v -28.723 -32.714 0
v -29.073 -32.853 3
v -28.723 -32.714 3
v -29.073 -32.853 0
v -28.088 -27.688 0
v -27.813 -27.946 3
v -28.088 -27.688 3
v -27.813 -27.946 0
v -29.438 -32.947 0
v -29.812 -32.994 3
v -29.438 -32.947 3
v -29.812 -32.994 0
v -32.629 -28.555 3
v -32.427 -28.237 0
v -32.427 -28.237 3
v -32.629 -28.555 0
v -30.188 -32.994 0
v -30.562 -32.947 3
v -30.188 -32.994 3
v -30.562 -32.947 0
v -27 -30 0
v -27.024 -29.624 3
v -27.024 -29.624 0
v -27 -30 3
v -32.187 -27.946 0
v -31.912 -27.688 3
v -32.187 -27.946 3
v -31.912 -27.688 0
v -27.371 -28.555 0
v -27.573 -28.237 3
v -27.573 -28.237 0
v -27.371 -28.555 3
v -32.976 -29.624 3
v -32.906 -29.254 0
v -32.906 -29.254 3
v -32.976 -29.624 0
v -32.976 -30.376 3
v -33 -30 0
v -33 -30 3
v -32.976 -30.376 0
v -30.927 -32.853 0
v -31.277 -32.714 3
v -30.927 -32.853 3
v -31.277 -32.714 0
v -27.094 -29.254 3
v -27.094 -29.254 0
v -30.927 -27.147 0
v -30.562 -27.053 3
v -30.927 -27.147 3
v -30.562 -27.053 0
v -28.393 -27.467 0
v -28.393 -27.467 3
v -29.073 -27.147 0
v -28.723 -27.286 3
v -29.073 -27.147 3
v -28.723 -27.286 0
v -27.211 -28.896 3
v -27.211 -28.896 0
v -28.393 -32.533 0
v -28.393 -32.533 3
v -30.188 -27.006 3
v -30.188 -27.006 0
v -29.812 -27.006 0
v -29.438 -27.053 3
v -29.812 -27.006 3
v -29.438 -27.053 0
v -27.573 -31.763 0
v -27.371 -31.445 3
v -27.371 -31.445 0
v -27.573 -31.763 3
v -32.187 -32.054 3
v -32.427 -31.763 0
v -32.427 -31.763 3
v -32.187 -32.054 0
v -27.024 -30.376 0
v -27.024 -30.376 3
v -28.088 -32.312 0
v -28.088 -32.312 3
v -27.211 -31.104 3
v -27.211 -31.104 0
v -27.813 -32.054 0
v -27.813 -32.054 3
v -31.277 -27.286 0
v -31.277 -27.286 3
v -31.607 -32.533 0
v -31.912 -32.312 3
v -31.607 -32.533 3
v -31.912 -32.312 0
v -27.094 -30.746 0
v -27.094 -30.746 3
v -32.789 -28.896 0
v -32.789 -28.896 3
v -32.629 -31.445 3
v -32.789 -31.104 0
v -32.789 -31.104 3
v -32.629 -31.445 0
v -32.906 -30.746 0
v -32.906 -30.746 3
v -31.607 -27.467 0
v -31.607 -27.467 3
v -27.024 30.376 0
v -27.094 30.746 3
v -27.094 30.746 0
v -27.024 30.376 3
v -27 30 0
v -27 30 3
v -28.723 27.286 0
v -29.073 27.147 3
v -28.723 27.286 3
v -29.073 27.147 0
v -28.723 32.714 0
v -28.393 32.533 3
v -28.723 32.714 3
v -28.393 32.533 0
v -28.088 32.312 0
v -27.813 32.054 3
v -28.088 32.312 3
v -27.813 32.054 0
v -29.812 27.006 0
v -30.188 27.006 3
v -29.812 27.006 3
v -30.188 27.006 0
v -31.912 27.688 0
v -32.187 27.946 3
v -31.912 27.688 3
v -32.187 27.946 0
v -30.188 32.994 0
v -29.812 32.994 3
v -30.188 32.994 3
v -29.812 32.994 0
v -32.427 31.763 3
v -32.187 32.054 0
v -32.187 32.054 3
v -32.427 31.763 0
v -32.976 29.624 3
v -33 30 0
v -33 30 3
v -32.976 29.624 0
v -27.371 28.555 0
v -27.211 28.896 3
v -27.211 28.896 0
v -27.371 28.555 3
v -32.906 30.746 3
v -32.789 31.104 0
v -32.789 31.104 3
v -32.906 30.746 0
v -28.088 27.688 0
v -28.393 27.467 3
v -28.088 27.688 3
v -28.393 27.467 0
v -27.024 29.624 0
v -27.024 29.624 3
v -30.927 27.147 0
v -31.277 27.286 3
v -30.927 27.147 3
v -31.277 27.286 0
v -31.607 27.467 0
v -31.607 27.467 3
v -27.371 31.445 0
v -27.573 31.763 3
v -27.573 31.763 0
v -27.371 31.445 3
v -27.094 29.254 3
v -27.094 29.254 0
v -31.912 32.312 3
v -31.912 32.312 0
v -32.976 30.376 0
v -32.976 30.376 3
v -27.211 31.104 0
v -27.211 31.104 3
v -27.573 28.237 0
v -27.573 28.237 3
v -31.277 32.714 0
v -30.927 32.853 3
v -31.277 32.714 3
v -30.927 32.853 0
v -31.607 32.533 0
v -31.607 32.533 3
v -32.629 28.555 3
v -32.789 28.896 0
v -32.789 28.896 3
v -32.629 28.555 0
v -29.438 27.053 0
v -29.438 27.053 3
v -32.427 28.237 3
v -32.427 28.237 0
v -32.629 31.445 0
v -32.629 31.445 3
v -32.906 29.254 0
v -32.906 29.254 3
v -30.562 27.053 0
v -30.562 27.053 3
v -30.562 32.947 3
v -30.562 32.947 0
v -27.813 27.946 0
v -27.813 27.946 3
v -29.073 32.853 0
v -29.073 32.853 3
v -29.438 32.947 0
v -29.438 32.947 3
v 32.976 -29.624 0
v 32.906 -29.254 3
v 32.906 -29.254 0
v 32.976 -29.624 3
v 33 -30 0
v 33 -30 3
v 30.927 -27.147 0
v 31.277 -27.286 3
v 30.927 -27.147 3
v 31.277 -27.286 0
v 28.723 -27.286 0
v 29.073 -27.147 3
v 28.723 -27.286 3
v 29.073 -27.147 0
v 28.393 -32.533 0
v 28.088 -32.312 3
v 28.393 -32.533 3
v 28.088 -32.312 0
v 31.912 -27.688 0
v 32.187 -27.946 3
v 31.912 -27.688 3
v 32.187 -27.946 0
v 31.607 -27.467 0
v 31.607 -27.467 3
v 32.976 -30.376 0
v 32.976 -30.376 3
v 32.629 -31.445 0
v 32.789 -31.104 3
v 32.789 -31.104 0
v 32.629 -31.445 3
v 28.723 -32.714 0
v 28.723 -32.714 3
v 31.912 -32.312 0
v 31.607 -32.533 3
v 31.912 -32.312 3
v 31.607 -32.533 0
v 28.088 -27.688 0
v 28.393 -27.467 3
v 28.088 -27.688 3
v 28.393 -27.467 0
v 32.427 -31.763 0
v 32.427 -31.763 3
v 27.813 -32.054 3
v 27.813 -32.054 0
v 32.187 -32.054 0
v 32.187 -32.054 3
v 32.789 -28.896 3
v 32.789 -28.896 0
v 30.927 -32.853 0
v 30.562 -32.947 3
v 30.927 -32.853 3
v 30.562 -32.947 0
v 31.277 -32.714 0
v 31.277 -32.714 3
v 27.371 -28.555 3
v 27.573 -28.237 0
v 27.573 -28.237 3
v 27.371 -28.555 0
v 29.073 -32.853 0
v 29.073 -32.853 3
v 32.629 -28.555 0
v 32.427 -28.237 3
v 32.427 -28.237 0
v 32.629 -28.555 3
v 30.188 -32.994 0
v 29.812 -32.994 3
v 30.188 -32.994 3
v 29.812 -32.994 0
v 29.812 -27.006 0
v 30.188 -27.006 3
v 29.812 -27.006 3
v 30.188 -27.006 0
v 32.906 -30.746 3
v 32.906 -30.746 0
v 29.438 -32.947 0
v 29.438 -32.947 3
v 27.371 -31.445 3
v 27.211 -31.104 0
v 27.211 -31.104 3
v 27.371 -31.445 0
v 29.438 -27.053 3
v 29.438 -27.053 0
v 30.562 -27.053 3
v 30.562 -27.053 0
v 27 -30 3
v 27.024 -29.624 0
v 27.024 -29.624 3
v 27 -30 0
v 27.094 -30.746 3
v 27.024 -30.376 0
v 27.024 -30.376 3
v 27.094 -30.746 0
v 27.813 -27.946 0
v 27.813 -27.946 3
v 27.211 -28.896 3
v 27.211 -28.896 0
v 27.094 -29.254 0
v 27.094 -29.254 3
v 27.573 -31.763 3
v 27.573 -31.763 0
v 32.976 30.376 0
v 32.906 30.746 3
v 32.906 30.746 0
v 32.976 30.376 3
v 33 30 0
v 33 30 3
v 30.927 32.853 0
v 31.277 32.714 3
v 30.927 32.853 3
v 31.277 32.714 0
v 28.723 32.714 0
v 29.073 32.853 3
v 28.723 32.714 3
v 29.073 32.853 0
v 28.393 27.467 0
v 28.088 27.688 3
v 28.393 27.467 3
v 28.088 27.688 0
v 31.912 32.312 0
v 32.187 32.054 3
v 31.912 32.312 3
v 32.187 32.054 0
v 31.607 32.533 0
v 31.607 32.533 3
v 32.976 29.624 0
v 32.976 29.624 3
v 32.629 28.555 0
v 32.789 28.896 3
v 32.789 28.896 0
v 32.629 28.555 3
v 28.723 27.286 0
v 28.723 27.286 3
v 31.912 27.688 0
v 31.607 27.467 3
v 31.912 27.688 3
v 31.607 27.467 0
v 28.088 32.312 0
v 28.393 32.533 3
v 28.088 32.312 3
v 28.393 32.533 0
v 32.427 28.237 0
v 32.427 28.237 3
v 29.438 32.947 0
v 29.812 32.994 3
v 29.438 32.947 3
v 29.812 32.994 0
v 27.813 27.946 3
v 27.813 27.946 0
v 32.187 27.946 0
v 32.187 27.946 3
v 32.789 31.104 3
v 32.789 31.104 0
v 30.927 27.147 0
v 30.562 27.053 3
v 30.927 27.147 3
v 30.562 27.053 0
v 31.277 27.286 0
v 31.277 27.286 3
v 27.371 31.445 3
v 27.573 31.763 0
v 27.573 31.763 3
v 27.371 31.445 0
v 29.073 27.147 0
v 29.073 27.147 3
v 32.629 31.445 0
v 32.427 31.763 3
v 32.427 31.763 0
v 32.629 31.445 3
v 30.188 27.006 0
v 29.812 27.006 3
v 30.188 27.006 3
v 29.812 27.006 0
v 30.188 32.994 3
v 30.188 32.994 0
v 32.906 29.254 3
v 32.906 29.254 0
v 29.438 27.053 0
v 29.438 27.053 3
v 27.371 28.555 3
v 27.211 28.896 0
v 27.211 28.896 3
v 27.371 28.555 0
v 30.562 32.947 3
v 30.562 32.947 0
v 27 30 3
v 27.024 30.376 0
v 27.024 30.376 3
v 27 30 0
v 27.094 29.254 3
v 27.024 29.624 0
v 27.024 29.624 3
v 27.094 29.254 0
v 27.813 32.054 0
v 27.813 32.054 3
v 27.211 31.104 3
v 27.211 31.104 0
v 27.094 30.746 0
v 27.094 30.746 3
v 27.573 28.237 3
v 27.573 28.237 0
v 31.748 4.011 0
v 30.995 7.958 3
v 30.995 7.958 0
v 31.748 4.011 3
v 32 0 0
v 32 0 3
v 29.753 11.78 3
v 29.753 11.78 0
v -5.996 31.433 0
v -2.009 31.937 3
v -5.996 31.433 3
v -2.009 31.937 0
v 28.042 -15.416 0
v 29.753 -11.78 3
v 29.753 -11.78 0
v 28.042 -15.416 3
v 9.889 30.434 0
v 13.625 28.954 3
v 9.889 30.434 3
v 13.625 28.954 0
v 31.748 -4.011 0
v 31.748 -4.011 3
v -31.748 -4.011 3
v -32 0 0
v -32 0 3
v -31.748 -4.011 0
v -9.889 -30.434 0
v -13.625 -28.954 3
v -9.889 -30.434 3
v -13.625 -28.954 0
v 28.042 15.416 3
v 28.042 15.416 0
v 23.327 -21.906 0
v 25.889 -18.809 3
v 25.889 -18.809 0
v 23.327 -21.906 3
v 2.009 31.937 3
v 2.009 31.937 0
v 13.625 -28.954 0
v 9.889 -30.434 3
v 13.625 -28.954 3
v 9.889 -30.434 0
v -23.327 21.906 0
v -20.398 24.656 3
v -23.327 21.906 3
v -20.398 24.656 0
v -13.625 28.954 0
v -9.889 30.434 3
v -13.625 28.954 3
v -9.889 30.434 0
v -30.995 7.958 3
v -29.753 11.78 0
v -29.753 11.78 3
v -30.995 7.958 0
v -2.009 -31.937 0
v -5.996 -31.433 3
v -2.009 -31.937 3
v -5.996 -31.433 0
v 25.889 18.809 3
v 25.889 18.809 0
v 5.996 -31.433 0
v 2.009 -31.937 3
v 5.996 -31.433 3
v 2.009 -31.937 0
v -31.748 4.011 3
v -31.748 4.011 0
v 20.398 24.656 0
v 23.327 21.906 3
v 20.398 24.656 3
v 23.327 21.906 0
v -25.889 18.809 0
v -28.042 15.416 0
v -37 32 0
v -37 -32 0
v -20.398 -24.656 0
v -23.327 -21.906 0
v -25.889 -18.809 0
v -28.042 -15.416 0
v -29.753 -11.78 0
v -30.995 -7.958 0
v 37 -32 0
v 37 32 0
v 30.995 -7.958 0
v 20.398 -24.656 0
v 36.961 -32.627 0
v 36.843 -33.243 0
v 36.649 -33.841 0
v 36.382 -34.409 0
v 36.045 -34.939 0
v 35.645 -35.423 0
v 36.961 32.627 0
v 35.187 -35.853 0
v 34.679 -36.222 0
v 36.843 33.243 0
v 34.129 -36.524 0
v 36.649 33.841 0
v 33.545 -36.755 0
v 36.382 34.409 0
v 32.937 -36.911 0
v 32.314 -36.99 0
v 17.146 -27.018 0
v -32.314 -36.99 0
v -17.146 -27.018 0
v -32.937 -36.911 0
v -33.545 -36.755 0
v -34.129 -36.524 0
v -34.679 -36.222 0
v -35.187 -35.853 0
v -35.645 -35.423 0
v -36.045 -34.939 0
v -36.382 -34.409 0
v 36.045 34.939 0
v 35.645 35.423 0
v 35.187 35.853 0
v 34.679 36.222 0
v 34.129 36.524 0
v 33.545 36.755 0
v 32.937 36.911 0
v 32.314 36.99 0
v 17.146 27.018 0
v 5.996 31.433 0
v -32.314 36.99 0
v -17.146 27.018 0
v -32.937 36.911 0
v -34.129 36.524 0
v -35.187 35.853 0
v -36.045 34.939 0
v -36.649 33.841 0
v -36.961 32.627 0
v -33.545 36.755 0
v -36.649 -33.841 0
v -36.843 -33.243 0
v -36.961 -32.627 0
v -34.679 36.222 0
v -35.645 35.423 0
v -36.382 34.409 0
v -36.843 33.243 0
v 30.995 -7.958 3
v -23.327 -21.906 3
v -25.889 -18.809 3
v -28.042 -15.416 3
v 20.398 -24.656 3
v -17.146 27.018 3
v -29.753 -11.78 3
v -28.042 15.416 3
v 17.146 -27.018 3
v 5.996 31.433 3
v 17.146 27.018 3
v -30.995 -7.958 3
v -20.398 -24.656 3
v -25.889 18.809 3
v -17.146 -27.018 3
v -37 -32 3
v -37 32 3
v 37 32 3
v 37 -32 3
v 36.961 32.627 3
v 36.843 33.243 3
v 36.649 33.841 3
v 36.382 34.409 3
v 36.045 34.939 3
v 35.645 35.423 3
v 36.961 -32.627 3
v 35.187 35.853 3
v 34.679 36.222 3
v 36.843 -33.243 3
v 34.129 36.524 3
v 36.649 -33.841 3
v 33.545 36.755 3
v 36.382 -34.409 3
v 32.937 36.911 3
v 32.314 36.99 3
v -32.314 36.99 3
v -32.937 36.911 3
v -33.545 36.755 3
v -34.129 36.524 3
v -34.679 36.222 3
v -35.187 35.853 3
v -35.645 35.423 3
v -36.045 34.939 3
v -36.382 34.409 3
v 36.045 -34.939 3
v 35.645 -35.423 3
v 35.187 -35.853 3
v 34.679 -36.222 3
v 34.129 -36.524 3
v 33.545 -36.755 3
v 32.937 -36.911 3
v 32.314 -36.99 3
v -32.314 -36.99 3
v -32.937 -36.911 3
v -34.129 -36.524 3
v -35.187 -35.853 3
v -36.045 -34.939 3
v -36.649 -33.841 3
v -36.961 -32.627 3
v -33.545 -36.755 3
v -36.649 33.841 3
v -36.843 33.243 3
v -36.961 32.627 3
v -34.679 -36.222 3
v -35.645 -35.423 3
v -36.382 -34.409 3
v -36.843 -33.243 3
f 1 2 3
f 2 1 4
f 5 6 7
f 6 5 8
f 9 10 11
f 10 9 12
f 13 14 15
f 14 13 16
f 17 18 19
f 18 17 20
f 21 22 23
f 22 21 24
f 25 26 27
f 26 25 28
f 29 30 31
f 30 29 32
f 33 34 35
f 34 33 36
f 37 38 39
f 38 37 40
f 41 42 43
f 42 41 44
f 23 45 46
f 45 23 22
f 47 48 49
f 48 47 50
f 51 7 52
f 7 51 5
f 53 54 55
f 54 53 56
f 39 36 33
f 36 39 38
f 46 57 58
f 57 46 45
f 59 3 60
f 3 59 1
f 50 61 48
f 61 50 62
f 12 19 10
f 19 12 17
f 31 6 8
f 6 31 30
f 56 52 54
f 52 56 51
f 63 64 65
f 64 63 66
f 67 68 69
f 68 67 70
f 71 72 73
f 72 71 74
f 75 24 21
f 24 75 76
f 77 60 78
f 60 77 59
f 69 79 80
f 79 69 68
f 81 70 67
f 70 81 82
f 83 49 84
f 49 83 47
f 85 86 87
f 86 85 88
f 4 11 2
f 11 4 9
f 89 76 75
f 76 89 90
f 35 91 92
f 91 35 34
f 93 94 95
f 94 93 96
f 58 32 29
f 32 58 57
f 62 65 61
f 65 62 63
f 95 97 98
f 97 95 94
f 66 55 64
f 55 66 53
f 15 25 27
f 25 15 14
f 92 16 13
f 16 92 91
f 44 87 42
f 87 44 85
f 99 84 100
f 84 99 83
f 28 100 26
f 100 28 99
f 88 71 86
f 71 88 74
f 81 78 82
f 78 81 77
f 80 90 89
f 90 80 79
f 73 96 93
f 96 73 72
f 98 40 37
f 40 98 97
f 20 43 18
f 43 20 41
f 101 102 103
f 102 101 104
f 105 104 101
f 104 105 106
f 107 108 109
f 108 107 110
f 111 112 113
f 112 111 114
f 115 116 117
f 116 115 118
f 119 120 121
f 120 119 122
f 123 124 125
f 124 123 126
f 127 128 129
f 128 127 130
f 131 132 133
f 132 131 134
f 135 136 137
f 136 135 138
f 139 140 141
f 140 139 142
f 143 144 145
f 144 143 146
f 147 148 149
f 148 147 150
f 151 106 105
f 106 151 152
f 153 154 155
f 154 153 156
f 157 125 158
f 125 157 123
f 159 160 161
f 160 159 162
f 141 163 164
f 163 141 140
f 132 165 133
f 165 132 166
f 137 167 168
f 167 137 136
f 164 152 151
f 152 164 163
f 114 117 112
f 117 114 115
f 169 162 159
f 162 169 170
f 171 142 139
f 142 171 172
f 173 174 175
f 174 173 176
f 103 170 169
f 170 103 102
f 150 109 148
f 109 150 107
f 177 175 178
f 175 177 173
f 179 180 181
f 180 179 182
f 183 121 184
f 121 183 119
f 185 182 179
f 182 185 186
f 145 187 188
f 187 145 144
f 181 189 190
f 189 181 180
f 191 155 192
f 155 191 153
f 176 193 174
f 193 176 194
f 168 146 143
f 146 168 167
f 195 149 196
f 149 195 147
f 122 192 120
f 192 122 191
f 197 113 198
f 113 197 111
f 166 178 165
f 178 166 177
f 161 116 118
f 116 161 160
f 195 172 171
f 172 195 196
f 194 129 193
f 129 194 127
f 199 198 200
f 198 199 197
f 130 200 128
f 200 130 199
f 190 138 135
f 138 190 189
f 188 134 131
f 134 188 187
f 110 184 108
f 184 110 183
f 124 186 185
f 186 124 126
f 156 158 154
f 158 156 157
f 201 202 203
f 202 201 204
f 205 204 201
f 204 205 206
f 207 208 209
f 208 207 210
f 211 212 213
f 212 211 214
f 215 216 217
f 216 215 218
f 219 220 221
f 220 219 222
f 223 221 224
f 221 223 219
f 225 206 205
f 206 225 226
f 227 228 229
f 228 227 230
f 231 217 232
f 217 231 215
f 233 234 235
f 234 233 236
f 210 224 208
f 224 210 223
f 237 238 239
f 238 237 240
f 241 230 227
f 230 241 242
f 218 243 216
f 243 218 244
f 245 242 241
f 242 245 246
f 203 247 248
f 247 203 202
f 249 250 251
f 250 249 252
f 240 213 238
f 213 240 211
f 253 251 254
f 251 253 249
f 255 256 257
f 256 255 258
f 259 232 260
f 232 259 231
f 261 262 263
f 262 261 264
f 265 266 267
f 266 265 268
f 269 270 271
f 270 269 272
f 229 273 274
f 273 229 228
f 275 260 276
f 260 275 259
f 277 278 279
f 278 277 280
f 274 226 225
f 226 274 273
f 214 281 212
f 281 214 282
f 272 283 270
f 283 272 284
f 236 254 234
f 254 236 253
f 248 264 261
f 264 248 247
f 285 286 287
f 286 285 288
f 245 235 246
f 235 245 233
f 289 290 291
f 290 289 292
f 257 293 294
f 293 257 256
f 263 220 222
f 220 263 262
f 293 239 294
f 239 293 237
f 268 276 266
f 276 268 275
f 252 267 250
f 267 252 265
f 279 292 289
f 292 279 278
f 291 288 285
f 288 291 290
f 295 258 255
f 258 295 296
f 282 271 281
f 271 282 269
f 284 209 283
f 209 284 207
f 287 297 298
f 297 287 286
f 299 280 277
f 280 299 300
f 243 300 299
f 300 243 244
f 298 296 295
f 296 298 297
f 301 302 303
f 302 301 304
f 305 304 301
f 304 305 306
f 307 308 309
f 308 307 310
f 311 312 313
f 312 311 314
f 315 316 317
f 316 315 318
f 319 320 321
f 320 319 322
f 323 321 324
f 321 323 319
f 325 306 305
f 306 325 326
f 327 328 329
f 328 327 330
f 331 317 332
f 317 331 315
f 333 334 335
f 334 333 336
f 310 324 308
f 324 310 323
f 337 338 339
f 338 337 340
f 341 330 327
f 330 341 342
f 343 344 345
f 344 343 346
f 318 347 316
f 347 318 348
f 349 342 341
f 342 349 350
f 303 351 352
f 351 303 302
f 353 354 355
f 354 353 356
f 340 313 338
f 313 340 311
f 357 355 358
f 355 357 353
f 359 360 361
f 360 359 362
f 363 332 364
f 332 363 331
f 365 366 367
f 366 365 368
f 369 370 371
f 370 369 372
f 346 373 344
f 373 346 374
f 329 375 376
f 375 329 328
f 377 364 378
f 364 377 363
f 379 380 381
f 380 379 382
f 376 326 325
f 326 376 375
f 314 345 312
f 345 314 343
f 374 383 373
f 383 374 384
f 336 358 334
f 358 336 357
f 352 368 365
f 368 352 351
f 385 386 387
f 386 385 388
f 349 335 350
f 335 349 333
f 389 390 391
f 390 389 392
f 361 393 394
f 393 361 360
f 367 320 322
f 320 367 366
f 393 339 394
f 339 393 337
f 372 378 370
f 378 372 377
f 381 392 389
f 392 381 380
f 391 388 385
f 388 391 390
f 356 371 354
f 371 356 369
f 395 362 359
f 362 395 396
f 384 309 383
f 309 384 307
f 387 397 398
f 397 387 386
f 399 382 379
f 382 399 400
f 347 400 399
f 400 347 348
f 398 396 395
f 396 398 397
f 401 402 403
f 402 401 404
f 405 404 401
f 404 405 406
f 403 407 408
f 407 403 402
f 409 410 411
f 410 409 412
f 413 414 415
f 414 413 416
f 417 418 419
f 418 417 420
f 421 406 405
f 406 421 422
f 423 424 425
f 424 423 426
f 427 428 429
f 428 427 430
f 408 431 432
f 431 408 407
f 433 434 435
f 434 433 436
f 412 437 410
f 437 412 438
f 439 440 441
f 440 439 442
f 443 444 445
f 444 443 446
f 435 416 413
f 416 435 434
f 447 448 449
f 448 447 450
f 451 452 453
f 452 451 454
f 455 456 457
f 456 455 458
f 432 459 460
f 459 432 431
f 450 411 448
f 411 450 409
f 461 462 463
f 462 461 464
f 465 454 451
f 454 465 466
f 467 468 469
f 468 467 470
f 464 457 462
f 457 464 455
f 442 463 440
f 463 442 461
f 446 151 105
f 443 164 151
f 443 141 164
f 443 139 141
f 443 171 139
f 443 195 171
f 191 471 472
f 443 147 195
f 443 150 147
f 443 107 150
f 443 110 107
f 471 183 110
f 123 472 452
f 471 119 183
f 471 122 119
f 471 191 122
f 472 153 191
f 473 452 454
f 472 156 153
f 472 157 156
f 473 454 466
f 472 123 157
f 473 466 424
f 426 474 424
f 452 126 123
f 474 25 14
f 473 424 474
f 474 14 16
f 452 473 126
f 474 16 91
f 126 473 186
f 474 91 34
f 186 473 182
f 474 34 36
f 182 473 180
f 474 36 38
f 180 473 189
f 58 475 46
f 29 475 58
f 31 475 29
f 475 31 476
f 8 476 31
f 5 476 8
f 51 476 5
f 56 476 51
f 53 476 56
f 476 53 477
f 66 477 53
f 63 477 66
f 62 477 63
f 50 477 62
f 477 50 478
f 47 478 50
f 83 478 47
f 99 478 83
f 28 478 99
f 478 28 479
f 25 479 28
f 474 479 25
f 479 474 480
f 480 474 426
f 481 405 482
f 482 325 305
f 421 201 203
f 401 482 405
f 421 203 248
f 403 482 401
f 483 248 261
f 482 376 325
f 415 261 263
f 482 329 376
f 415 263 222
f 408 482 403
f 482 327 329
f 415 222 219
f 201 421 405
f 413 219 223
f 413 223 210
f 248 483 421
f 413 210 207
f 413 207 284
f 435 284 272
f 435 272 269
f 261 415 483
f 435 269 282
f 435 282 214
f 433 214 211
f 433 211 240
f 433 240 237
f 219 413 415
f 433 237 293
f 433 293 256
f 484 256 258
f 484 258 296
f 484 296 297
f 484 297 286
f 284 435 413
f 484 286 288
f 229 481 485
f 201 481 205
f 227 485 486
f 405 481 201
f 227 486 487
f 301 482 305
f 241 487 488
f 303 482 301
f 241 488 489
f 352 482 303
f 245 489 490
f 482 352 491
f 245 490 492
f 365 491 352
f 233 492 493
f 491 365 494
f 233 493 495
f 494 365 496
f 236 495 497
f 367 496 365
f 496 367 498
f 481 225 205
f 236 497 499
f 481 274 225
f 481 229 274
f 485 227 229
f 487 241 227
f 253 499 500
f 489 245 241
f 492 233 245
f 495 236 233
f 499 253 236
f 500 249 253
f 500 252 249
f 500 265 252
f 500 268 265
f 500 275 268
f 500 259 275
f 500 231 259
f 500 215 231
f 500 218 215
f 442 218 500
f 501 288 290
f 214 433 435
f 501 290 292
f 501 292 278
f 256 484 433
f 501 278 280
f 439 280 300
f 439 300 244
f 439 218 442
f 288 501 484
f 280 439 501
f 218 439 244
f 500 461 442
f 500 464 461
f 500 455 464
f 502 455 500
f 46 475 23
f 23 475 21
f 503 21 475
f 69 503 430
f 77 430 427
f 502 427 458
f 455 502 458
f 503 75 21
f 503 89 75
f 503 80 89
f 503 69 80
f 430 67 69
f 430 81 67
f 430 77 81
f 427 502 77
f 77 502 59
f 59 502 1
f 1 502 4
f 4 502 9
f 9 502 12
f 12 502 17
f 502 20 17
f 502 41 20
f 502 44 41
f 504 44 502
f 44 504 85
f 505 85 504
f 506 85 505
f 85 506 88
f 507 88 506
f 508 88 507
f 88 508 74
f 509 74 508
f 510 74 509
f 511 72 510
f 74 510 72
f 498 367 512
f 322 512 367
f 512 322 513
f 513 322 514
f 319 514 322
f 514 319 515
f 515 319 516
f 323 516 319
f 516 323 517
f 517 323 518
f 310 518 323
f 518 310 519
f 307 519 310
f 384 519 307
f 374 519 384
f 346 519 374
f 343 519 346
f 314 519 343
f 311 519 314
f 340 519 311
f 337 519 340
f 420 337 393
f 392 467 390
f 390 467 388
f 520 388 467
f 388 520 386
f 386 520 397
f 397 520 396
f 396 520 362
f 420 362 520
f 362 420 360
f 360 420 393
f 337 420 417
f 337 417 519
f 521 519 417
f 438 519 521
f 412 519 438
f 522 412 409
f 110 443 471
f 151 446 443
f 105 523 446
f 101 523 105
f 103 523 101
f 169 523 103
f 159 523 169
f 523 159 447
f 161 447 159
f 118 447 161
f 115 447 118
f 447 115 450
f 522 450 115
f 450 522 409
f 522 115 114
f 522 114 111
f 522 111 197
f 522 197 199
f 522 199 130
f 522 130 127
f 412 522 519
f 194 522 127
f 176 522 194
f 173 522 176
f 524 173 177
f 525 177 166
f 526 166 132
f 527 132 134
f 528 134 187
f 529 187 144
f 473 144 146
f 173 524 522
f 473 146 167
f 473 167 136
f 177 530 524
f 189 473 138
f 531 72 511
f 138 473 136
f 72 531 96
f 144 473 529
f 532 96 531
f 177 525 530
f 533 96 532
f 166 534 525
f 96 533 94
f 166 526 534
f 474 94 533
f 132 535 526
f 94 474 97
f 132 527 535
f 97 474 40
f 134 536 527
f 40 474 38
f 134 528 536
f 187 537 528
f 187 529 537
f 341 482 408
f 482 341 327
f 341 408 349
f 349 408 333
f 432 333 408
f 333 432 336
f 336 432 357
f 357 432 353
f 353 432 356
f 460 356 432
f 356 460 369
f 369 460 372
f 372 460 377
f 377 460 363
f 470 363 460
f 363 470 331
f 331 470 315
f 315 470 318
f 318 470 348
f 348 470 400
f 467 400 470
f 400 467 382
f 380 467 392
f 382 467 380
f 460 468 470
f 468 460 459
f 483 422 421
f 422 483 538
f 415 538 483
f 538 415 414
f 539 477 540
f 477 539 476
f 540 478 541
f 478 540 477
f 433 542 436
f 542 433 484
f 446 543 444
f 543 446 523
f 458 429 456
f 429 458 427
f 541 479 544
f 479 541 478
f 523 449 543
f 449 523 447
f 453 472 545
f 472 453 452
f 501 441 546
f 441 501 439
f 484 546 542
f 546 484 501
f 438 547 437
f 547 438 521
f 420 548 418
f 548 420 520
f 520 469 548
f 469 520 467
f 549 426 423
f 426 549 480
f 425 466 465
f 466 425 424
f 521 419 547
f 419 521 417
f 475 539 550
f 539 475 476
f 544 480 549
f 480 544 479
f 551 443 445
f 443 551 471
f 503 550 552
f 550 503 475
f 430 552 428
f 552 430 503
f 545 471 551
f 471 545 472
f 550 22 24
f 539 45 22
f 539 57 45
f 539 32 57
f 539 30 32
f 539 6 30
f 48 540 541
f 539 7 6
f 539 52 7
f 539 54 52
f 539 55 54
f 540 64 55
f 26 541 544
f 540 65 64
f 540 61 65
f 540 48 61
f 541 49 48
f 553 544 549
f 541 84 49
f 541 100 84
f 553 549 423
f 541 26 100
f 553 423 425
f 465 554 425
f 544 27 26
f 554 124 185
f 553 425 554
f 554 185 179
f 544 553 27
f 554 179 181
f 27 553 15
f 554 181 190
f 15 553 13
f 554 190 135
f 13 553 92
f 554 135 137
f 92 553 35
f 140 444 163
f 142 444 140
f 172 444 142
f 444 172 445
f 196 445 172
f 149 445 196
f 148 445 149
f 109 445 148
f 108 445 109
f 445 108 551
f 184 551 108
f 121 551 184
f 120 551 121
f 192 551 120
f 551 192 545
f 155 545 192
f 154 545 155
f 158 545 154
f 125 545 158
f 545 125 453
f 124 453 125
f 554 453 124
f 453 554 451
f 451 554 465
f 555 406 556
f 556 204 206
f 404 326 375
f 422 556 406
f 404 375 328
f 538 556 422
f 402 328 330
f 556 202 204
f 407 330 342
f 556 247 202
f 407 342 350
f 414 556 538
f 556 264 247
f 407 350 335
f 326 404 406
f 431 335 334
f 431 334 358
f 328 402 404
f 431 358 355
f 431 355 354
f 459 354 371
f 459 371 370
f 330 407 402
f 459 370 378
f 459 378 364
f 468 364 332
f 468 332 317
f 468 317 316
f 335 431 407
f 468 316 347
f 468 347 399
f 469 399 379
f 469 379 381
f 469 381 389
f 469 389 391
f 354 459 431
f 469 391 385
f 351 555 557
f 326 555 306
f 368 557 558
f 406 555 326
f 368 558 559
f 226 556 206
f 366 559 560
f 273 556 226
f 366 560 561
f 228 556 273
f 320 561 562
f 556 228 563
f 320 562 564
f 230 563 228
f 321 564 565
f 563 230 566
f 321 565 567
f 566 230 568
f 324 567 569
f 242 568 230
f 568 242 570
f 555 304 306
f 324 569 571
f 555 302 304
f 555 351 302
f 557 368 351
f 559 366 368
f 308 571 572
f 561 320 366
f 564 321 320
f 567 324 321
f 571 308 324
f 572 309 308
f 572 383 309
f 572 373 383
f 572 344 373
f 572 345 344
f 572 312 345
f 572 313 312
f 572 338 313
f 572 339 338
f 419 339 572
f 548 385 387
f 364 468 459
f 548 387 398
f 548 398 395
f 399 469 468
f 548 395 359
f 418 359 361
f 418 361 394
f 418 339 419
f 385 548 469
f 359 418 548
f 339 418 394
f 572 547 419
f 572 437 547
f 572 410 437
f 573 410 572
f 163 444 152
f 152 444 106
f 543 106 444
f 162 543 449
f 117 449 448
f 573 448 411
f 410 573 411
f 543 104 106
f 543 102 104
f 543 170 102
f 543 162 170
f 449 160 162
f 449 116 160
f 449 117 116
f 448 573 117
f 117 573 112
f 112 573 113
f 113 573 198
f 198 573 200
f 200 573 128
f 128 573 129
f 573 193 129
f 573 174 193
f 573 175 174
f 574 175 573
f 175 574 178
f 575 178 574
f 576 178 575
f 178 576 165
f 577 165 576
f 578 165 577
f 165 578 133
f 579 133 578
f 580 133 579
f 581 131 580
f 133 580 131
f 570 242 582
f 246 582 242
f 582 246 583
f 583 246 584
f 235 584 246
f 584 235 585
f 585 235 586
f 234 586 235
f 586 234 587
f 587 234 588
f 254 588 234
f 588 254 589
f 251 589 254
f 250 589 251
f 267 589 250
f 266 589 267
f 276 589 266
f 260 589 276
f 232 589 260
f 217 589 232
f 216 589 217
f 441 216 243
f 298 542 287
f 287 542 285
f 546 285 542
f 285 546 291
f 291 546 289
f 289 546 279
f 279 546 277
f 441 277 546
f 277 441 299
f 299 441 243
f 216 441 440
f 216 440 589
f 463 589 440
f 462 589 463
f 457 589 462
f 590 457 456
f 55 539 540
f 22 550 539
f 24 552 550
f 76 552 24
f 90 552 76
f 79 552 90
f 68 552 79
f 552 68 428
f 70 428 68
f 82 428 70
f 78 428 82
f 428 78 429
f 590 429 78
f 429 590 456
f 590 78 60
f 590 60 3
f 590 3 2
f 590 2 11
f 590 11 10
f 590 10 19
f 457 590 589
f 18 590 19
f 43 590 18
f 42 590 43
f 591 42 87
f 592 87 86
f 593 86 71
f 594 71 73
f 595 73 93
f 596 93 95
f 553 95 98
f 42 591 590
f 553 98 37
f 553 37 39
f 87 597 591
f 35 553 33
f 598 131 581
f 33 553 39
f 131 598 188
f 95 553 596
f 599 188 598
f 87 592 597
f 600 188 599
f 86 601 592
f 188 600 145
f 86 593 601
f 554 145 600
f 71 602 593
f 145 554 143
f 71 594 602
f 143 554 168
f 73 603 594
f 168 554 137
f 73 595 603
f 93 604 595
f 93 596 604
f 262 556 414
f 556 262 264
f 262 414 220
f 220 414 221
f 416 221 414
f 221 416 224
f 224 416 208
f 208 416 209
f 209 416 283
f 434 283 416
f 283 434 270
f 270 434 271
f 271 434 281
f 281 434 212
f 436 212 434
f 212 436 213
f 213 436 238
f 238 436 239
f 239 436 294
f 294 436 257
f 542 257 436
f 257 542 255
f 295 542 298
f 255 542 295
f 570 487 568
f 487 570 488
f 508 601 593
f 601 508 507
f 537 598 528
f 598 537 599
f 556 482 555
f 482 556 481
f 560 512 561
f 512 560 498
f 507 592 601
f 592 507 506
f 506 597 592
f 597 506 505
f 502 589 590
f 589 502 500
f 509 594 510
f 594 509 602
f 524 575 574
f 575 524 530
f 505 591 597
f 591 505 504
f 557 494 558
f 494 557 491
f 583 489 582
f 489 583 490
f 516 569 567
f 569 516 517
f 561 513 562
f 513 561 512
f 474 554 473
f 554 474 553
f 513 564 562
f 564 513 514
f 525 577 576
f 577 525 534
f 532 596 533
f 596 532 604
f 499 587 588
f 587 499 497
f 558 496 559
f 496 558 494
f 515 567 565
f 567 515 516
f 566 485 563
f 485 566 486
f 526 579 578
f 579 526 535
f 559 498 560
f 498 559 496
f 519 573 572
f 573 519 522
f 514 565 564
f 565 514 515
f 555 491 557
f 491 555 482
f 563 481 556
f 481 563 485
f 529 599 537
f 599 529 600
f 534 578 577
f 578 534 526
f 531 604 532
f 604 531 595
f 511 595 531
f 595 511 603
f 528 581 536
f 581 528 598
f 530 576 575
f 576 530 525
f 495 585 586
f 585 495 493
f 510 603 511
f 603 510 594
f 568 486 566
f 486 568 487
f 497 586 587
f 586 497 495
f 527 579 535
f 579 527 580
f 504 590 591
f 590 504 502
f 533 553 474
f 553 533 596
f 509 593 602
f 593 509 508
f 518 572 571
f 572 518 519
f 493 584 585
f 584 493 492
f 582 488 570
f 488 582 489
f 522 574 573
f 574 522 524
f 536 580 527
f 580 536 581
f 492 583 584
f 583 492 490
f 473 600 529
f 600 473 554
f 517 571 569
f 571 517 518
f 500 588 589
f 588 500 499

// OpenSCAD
$fn = 50;


difference() {
	union() {
		hull() {
			translate(v = [-32.0000000000, 32.0000000000, 0]) {
				cylinder(h = 3, r = 5);
			}
			translate(v = [32.0000000000, 32.0000000000, 0]) {
				cylinder(h = 3, r = 5);
			}
			translate(v = [-32.0000000000, -32.0000000000, 0]) {
				cylinder(h = 3, r = 5);
			}
			translate(v = [32.0000000000, -32.0000000000, 0]) {
				cylinder(h = 3, r = 5);
			}
		}
	}
	union() {
		#translate(v = [-30.0000000000, -30.0000000000, -100.0000000000]) {
			cylinder(h = 200, r = 3.0000000000);
		}
		#translate(v = [-30.0000000000, 30.0000000000, -100.0000000000]) {
			cylinder(h = 200, r = 3.0000000000);
		}
		#translate(v = [30.0000000000, -30.0000000000, -100.0000000000]) {
			cylinder(h = 200, r = 3.0000000000);
		}
		#translate(v = [30.0000000000, 30.0000000000, -100.0000000000]) {
			cylinder(h = 200, r = 3.0000000000);
		}
		#cylinder(h = 3, r = 32.0000000000);
	}
}
